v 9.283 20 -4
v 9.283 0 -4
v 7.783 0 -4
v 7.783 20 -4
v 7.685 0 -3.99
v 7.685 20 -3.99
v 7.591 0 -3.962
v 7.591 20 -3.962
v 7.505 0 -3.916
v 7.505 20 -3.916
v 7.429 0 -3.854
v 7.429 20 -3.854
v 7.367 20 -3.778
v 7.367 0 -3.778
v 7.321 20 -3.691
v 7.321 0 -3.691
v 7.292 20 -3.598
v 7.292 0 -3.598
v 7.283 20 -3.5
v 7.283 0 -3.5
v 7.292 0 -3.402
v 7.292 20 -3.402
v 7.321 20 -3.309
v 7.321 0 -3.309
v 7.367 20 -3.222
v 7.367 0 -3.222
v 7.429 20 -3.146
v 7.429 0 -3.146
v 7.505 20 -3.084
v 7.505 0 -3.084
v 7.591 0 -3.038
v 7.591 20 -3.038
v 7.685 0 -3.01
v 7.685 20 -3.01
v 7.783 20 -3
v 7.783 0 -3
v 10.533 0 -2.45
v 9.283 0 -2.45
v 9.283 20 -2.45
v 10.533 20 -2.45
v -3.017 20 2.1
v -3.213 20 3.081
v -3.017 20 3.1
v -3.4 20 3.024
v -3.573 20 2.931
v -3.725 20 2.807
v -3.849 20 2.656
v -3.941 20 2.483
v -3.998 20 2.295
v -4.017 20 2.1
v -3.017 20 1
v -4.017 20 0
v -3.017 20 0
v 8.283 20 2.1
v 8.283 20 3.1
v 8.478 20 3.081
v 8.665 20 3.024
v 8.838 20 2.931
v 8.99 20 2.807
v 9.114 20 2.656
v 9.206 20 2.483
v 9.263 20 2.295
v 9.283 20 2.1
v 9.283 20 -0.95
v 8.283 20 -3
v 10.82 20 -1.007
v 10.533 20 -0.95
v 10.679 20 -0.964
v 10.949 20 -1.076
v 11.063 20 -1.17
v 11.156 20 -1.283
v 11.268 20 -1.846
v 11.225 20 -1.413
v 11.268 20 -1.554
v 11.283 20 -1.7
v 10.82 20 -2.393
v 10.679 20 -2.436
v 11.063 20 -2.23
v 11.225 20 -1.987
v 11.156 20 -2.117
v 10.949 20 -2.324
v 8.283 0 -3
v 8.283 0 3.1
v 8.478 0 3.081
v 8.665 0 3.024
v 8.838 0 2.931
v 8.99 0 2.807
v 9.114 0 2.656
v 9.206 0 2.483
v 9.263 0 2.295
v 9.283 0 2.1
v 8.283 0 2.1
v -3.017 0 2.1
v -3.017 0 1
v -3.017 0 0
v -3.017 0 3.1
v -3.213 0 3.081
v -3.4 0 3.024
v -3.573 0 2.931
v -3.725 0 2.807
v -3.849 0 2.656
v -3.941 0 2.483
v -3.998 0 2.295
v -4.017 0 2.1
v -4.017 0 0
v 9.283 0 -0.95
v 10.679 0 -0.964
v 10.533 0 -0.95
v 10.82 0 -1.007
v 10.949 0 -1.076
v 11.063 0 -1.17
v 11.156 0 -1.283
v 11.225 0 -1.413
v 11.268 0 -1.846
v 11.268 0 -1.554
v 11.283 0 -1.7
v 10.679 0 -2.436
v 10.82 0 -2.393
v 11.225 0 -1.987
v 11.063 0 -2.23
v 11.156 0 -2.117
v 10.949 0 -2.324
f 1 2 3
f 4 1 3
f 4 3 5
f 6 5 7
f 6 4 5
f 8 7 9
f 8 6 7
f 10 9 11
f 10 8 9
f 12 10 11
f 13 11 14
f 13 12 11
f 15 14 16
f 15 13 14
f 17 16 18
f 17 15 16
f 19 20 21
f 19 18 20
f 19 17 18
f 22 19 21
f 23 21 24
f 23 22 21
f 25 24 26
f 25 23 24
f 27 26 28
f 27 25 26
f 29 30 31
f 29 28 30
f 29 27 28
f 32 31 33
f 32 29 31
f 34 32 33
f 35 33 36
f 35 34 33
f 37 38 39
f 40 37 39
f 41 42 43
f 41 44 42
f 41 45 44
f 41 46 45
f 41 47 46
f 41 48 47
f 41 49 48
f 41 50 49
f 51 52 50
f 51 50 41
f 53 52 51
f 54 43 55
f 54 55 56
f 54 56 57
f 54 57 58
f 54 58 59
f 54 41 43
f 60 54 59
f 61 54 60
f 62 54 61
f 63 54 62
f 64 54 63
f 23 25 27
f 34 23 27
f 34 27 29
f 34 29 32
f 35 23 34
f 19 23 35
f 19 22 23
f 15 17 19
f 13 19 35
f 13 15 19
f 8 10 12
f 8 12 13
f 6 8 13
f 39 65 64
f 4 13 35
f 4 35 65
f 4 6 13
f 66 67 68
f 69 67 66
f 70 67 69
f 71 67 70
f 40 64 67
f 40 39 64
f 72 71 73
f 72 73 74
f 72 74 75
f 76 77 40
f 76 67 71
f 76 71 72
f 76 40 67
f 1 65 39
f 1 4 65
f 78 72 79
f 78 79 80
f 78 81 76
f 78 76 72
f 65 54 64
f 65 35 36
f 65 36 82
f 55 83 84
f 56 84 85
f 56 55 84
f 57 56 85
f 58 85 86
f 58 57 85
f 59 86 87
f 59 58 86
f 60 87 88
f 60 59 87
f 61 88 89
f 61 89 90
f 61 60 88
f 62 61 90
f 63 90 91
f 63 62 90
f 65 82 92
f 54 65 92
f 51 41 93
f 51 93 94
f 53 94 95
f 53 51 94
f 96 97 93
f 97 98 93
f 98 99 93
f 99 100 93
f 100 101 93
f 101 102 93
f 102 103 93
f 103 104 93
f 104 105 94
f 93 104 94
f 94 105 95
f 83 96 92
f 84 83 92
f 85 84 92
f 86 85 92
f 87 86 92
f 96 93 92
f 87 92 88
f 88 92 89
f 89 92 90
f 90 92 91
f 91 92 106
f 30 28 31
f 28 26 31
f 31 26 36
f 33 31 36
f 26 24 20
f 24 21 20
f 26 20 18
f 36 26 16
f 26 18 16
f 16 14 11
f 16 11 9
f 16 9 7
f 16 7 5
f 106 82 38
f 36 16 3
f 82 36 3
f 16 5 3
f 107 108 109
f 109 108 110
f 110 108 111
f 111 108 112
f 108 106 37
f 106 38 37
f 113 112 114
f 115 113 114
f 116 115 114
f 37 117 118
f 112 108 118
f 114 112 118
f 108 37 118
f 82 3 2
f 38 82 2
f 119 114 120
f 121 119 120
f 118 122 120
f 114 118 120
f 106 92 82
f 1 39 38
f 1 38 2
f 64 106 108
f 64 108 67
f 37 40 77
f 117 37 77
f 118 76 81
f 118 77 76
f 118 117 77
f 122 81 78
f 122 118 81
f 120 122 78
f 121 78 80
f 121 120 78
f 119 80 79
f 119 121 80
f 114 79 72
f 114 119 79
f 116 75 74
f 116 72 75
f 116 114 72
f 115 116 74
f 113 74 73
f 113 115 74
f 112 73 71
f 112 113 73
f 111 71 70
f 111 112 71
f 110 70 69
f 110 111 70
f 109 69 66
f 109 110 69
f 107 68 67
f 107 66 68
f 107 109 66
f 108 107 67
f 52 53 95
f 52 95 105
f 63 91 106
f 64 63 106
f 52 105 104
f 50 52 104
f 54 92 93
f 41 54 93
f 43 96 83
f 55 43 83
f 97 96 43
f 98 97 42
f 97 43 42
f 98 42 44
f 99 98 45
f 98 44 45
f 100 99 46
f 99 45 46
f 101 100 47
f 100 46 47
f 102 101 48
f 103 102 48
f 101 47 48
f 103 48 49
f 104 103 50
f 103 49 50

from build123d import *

# Parameters (mm, degrees)
SALIENTE_EXTRUIR1_DEPTH = 20
REDONDEO1_RADIUS        = 0.5
REDONDEO1_LENGTH        = 20
REDONDEO3_R             = 1
REDONDEO4_R             = 1
CROQUIS6_W              = 0.519230147
CROQUIS6_H              = 1.134138633
CORTAR_EXTRUIR2_DEPTH   = 31
CROQUIS7_W              = 1.5
CROQUIS7_H              = 20
SALIENTE_EXTRUIR2_DEPTH = 2
REDONDEO5_RADIUS        = 0.75
REDONDEO5_LENGTH        = 20


with BuildPart() as part:
    # Croquis3 → Saliente-Extruir1 (new body)
    with BuildSketch(Plane(origin=(0, 0, 0), x_dir=(1, 0, 0), z_dir=(0, 1, 0))):
        Polygon((-2.726281257, 0), (-4.017413973, 0), (-4.017413973, -3.1), (9.282586027, -3.1), (9.282586027, 4), (7.282586027, 4), (7.282586027, 3), (8.282586027, 3), (8.282586027, -2.1), (-3.017413973, -2.1), (-3.017413973, -1), (-2.726281257, -1), align=None)
    extrude(amount=SALIENTE_EXTRUIR1_DEPTH)

    # Redondeo1: full round fillet: the end face becomes a half cylinder, R = half its width
    redondeo1_face = Plane((7.282586027, 10, -3.5), x_dir=(0, 1, 0), z_dir=(-1, 0, 0))  # on the end face: x along it, z out of the body
    redondeo1_slab = redondeo1_face.offset(-REDONDEO1_RADIUS / 2) * Box(REDONDEO1_LENGTH, 2 * REDONDEO1_RADIUS, REDONDEO1_RADIUS, mode=Mode.PRIVATE)  # the body's end, R deep
    redondeo1_round = Plane((7.782586027, 10, -3.5), x_dir=(-1, 0, 0), z_dir=(0, 1, 0)) * Cylinder(REDONDEO1_RADIUS, REDONDEO1_LENGTH, mode=Mode.PRIVATE)  # its axis R under the face
    add(redondeo1_slab - redondeo1_round, mode=Mode.SUBTRACT)

    # Redondeo3
    redondeo3_edges = [part.edges().sort_by_distance(p)[0] for p in [
        (-4.017413973, 10, 3.1),
    ]]
    fillet(redondeo3_edges, radius=REDONDEO3_R)

    # Redondeo4
    redondeo4_edges = [part.edges().sort_by_distance(p)[0] for p in [
        (9.282586027, 10, 3.1),
    ]]
    fillet(redondeo4_edges, radius=REDONDEO4_R)

    # Croquis6 → Cortar-Extruir2 (cut)
    with BuildSketch(Plane(origin=(0, 20, 0), x_dir=(1, 0, 0), z_dir=(0, 1, 0))):
        with Locations((-2.7577989, -0.432930683)):
            Rectangle(CROQUIS6_W, CROQUIS6_H)
    extrude(amount=-CORTAR_EXTRUIR2_DEPTH, mode=Mode.SUBTRACT)

    # Croquis7 → Saliente-Extruir2 (add)
    with BuildSketch(Plane(origin=(9.282586027, 0, 0), x_dir=(0, 0, -1), z_dir=(1, 0, 0))):
        with Locations((1.7, 10)):
            Rectangle(CROQUIS7_W, CROQUIS7_H)
    extrude(amount=SALIENTE_EXTRUIR2_DEPTH)

    # Redondeo5: full round fillet: the end face becomes a half cylinder, R = half its width
    redondeo5_face = Plane((11.282586027, 10, -1.7), x_dir=(0, -1, 0), z_dir=(1, 0, 0))  # on the end face: x along it, z out of the body
    redondeo5_slab = redondeo5_face.offset(-REDONDEO5_RADIUS / 2) * Box(REDONDEO5_LENGTH, 2 * REDONDEO5_RADIUS, REDONDEO5_RADIUS, mode=Mode.PRIVATE)  # the body's end, R deep
    redondeo5_round = Plane((10.532586027, 10, -1.7), x_dir=(1, 0, 0), z_dir=(0, -1, 0)) * Cylinder(REDONDEO5_RADIUS, REDONDEO5_LENGTH, mode=Mode.PRIVATE)  # its axis R under the face
    add(redondeo5_slab - redondeo5_round, mode=Mode.SUBTRACT)


solid = part.part
